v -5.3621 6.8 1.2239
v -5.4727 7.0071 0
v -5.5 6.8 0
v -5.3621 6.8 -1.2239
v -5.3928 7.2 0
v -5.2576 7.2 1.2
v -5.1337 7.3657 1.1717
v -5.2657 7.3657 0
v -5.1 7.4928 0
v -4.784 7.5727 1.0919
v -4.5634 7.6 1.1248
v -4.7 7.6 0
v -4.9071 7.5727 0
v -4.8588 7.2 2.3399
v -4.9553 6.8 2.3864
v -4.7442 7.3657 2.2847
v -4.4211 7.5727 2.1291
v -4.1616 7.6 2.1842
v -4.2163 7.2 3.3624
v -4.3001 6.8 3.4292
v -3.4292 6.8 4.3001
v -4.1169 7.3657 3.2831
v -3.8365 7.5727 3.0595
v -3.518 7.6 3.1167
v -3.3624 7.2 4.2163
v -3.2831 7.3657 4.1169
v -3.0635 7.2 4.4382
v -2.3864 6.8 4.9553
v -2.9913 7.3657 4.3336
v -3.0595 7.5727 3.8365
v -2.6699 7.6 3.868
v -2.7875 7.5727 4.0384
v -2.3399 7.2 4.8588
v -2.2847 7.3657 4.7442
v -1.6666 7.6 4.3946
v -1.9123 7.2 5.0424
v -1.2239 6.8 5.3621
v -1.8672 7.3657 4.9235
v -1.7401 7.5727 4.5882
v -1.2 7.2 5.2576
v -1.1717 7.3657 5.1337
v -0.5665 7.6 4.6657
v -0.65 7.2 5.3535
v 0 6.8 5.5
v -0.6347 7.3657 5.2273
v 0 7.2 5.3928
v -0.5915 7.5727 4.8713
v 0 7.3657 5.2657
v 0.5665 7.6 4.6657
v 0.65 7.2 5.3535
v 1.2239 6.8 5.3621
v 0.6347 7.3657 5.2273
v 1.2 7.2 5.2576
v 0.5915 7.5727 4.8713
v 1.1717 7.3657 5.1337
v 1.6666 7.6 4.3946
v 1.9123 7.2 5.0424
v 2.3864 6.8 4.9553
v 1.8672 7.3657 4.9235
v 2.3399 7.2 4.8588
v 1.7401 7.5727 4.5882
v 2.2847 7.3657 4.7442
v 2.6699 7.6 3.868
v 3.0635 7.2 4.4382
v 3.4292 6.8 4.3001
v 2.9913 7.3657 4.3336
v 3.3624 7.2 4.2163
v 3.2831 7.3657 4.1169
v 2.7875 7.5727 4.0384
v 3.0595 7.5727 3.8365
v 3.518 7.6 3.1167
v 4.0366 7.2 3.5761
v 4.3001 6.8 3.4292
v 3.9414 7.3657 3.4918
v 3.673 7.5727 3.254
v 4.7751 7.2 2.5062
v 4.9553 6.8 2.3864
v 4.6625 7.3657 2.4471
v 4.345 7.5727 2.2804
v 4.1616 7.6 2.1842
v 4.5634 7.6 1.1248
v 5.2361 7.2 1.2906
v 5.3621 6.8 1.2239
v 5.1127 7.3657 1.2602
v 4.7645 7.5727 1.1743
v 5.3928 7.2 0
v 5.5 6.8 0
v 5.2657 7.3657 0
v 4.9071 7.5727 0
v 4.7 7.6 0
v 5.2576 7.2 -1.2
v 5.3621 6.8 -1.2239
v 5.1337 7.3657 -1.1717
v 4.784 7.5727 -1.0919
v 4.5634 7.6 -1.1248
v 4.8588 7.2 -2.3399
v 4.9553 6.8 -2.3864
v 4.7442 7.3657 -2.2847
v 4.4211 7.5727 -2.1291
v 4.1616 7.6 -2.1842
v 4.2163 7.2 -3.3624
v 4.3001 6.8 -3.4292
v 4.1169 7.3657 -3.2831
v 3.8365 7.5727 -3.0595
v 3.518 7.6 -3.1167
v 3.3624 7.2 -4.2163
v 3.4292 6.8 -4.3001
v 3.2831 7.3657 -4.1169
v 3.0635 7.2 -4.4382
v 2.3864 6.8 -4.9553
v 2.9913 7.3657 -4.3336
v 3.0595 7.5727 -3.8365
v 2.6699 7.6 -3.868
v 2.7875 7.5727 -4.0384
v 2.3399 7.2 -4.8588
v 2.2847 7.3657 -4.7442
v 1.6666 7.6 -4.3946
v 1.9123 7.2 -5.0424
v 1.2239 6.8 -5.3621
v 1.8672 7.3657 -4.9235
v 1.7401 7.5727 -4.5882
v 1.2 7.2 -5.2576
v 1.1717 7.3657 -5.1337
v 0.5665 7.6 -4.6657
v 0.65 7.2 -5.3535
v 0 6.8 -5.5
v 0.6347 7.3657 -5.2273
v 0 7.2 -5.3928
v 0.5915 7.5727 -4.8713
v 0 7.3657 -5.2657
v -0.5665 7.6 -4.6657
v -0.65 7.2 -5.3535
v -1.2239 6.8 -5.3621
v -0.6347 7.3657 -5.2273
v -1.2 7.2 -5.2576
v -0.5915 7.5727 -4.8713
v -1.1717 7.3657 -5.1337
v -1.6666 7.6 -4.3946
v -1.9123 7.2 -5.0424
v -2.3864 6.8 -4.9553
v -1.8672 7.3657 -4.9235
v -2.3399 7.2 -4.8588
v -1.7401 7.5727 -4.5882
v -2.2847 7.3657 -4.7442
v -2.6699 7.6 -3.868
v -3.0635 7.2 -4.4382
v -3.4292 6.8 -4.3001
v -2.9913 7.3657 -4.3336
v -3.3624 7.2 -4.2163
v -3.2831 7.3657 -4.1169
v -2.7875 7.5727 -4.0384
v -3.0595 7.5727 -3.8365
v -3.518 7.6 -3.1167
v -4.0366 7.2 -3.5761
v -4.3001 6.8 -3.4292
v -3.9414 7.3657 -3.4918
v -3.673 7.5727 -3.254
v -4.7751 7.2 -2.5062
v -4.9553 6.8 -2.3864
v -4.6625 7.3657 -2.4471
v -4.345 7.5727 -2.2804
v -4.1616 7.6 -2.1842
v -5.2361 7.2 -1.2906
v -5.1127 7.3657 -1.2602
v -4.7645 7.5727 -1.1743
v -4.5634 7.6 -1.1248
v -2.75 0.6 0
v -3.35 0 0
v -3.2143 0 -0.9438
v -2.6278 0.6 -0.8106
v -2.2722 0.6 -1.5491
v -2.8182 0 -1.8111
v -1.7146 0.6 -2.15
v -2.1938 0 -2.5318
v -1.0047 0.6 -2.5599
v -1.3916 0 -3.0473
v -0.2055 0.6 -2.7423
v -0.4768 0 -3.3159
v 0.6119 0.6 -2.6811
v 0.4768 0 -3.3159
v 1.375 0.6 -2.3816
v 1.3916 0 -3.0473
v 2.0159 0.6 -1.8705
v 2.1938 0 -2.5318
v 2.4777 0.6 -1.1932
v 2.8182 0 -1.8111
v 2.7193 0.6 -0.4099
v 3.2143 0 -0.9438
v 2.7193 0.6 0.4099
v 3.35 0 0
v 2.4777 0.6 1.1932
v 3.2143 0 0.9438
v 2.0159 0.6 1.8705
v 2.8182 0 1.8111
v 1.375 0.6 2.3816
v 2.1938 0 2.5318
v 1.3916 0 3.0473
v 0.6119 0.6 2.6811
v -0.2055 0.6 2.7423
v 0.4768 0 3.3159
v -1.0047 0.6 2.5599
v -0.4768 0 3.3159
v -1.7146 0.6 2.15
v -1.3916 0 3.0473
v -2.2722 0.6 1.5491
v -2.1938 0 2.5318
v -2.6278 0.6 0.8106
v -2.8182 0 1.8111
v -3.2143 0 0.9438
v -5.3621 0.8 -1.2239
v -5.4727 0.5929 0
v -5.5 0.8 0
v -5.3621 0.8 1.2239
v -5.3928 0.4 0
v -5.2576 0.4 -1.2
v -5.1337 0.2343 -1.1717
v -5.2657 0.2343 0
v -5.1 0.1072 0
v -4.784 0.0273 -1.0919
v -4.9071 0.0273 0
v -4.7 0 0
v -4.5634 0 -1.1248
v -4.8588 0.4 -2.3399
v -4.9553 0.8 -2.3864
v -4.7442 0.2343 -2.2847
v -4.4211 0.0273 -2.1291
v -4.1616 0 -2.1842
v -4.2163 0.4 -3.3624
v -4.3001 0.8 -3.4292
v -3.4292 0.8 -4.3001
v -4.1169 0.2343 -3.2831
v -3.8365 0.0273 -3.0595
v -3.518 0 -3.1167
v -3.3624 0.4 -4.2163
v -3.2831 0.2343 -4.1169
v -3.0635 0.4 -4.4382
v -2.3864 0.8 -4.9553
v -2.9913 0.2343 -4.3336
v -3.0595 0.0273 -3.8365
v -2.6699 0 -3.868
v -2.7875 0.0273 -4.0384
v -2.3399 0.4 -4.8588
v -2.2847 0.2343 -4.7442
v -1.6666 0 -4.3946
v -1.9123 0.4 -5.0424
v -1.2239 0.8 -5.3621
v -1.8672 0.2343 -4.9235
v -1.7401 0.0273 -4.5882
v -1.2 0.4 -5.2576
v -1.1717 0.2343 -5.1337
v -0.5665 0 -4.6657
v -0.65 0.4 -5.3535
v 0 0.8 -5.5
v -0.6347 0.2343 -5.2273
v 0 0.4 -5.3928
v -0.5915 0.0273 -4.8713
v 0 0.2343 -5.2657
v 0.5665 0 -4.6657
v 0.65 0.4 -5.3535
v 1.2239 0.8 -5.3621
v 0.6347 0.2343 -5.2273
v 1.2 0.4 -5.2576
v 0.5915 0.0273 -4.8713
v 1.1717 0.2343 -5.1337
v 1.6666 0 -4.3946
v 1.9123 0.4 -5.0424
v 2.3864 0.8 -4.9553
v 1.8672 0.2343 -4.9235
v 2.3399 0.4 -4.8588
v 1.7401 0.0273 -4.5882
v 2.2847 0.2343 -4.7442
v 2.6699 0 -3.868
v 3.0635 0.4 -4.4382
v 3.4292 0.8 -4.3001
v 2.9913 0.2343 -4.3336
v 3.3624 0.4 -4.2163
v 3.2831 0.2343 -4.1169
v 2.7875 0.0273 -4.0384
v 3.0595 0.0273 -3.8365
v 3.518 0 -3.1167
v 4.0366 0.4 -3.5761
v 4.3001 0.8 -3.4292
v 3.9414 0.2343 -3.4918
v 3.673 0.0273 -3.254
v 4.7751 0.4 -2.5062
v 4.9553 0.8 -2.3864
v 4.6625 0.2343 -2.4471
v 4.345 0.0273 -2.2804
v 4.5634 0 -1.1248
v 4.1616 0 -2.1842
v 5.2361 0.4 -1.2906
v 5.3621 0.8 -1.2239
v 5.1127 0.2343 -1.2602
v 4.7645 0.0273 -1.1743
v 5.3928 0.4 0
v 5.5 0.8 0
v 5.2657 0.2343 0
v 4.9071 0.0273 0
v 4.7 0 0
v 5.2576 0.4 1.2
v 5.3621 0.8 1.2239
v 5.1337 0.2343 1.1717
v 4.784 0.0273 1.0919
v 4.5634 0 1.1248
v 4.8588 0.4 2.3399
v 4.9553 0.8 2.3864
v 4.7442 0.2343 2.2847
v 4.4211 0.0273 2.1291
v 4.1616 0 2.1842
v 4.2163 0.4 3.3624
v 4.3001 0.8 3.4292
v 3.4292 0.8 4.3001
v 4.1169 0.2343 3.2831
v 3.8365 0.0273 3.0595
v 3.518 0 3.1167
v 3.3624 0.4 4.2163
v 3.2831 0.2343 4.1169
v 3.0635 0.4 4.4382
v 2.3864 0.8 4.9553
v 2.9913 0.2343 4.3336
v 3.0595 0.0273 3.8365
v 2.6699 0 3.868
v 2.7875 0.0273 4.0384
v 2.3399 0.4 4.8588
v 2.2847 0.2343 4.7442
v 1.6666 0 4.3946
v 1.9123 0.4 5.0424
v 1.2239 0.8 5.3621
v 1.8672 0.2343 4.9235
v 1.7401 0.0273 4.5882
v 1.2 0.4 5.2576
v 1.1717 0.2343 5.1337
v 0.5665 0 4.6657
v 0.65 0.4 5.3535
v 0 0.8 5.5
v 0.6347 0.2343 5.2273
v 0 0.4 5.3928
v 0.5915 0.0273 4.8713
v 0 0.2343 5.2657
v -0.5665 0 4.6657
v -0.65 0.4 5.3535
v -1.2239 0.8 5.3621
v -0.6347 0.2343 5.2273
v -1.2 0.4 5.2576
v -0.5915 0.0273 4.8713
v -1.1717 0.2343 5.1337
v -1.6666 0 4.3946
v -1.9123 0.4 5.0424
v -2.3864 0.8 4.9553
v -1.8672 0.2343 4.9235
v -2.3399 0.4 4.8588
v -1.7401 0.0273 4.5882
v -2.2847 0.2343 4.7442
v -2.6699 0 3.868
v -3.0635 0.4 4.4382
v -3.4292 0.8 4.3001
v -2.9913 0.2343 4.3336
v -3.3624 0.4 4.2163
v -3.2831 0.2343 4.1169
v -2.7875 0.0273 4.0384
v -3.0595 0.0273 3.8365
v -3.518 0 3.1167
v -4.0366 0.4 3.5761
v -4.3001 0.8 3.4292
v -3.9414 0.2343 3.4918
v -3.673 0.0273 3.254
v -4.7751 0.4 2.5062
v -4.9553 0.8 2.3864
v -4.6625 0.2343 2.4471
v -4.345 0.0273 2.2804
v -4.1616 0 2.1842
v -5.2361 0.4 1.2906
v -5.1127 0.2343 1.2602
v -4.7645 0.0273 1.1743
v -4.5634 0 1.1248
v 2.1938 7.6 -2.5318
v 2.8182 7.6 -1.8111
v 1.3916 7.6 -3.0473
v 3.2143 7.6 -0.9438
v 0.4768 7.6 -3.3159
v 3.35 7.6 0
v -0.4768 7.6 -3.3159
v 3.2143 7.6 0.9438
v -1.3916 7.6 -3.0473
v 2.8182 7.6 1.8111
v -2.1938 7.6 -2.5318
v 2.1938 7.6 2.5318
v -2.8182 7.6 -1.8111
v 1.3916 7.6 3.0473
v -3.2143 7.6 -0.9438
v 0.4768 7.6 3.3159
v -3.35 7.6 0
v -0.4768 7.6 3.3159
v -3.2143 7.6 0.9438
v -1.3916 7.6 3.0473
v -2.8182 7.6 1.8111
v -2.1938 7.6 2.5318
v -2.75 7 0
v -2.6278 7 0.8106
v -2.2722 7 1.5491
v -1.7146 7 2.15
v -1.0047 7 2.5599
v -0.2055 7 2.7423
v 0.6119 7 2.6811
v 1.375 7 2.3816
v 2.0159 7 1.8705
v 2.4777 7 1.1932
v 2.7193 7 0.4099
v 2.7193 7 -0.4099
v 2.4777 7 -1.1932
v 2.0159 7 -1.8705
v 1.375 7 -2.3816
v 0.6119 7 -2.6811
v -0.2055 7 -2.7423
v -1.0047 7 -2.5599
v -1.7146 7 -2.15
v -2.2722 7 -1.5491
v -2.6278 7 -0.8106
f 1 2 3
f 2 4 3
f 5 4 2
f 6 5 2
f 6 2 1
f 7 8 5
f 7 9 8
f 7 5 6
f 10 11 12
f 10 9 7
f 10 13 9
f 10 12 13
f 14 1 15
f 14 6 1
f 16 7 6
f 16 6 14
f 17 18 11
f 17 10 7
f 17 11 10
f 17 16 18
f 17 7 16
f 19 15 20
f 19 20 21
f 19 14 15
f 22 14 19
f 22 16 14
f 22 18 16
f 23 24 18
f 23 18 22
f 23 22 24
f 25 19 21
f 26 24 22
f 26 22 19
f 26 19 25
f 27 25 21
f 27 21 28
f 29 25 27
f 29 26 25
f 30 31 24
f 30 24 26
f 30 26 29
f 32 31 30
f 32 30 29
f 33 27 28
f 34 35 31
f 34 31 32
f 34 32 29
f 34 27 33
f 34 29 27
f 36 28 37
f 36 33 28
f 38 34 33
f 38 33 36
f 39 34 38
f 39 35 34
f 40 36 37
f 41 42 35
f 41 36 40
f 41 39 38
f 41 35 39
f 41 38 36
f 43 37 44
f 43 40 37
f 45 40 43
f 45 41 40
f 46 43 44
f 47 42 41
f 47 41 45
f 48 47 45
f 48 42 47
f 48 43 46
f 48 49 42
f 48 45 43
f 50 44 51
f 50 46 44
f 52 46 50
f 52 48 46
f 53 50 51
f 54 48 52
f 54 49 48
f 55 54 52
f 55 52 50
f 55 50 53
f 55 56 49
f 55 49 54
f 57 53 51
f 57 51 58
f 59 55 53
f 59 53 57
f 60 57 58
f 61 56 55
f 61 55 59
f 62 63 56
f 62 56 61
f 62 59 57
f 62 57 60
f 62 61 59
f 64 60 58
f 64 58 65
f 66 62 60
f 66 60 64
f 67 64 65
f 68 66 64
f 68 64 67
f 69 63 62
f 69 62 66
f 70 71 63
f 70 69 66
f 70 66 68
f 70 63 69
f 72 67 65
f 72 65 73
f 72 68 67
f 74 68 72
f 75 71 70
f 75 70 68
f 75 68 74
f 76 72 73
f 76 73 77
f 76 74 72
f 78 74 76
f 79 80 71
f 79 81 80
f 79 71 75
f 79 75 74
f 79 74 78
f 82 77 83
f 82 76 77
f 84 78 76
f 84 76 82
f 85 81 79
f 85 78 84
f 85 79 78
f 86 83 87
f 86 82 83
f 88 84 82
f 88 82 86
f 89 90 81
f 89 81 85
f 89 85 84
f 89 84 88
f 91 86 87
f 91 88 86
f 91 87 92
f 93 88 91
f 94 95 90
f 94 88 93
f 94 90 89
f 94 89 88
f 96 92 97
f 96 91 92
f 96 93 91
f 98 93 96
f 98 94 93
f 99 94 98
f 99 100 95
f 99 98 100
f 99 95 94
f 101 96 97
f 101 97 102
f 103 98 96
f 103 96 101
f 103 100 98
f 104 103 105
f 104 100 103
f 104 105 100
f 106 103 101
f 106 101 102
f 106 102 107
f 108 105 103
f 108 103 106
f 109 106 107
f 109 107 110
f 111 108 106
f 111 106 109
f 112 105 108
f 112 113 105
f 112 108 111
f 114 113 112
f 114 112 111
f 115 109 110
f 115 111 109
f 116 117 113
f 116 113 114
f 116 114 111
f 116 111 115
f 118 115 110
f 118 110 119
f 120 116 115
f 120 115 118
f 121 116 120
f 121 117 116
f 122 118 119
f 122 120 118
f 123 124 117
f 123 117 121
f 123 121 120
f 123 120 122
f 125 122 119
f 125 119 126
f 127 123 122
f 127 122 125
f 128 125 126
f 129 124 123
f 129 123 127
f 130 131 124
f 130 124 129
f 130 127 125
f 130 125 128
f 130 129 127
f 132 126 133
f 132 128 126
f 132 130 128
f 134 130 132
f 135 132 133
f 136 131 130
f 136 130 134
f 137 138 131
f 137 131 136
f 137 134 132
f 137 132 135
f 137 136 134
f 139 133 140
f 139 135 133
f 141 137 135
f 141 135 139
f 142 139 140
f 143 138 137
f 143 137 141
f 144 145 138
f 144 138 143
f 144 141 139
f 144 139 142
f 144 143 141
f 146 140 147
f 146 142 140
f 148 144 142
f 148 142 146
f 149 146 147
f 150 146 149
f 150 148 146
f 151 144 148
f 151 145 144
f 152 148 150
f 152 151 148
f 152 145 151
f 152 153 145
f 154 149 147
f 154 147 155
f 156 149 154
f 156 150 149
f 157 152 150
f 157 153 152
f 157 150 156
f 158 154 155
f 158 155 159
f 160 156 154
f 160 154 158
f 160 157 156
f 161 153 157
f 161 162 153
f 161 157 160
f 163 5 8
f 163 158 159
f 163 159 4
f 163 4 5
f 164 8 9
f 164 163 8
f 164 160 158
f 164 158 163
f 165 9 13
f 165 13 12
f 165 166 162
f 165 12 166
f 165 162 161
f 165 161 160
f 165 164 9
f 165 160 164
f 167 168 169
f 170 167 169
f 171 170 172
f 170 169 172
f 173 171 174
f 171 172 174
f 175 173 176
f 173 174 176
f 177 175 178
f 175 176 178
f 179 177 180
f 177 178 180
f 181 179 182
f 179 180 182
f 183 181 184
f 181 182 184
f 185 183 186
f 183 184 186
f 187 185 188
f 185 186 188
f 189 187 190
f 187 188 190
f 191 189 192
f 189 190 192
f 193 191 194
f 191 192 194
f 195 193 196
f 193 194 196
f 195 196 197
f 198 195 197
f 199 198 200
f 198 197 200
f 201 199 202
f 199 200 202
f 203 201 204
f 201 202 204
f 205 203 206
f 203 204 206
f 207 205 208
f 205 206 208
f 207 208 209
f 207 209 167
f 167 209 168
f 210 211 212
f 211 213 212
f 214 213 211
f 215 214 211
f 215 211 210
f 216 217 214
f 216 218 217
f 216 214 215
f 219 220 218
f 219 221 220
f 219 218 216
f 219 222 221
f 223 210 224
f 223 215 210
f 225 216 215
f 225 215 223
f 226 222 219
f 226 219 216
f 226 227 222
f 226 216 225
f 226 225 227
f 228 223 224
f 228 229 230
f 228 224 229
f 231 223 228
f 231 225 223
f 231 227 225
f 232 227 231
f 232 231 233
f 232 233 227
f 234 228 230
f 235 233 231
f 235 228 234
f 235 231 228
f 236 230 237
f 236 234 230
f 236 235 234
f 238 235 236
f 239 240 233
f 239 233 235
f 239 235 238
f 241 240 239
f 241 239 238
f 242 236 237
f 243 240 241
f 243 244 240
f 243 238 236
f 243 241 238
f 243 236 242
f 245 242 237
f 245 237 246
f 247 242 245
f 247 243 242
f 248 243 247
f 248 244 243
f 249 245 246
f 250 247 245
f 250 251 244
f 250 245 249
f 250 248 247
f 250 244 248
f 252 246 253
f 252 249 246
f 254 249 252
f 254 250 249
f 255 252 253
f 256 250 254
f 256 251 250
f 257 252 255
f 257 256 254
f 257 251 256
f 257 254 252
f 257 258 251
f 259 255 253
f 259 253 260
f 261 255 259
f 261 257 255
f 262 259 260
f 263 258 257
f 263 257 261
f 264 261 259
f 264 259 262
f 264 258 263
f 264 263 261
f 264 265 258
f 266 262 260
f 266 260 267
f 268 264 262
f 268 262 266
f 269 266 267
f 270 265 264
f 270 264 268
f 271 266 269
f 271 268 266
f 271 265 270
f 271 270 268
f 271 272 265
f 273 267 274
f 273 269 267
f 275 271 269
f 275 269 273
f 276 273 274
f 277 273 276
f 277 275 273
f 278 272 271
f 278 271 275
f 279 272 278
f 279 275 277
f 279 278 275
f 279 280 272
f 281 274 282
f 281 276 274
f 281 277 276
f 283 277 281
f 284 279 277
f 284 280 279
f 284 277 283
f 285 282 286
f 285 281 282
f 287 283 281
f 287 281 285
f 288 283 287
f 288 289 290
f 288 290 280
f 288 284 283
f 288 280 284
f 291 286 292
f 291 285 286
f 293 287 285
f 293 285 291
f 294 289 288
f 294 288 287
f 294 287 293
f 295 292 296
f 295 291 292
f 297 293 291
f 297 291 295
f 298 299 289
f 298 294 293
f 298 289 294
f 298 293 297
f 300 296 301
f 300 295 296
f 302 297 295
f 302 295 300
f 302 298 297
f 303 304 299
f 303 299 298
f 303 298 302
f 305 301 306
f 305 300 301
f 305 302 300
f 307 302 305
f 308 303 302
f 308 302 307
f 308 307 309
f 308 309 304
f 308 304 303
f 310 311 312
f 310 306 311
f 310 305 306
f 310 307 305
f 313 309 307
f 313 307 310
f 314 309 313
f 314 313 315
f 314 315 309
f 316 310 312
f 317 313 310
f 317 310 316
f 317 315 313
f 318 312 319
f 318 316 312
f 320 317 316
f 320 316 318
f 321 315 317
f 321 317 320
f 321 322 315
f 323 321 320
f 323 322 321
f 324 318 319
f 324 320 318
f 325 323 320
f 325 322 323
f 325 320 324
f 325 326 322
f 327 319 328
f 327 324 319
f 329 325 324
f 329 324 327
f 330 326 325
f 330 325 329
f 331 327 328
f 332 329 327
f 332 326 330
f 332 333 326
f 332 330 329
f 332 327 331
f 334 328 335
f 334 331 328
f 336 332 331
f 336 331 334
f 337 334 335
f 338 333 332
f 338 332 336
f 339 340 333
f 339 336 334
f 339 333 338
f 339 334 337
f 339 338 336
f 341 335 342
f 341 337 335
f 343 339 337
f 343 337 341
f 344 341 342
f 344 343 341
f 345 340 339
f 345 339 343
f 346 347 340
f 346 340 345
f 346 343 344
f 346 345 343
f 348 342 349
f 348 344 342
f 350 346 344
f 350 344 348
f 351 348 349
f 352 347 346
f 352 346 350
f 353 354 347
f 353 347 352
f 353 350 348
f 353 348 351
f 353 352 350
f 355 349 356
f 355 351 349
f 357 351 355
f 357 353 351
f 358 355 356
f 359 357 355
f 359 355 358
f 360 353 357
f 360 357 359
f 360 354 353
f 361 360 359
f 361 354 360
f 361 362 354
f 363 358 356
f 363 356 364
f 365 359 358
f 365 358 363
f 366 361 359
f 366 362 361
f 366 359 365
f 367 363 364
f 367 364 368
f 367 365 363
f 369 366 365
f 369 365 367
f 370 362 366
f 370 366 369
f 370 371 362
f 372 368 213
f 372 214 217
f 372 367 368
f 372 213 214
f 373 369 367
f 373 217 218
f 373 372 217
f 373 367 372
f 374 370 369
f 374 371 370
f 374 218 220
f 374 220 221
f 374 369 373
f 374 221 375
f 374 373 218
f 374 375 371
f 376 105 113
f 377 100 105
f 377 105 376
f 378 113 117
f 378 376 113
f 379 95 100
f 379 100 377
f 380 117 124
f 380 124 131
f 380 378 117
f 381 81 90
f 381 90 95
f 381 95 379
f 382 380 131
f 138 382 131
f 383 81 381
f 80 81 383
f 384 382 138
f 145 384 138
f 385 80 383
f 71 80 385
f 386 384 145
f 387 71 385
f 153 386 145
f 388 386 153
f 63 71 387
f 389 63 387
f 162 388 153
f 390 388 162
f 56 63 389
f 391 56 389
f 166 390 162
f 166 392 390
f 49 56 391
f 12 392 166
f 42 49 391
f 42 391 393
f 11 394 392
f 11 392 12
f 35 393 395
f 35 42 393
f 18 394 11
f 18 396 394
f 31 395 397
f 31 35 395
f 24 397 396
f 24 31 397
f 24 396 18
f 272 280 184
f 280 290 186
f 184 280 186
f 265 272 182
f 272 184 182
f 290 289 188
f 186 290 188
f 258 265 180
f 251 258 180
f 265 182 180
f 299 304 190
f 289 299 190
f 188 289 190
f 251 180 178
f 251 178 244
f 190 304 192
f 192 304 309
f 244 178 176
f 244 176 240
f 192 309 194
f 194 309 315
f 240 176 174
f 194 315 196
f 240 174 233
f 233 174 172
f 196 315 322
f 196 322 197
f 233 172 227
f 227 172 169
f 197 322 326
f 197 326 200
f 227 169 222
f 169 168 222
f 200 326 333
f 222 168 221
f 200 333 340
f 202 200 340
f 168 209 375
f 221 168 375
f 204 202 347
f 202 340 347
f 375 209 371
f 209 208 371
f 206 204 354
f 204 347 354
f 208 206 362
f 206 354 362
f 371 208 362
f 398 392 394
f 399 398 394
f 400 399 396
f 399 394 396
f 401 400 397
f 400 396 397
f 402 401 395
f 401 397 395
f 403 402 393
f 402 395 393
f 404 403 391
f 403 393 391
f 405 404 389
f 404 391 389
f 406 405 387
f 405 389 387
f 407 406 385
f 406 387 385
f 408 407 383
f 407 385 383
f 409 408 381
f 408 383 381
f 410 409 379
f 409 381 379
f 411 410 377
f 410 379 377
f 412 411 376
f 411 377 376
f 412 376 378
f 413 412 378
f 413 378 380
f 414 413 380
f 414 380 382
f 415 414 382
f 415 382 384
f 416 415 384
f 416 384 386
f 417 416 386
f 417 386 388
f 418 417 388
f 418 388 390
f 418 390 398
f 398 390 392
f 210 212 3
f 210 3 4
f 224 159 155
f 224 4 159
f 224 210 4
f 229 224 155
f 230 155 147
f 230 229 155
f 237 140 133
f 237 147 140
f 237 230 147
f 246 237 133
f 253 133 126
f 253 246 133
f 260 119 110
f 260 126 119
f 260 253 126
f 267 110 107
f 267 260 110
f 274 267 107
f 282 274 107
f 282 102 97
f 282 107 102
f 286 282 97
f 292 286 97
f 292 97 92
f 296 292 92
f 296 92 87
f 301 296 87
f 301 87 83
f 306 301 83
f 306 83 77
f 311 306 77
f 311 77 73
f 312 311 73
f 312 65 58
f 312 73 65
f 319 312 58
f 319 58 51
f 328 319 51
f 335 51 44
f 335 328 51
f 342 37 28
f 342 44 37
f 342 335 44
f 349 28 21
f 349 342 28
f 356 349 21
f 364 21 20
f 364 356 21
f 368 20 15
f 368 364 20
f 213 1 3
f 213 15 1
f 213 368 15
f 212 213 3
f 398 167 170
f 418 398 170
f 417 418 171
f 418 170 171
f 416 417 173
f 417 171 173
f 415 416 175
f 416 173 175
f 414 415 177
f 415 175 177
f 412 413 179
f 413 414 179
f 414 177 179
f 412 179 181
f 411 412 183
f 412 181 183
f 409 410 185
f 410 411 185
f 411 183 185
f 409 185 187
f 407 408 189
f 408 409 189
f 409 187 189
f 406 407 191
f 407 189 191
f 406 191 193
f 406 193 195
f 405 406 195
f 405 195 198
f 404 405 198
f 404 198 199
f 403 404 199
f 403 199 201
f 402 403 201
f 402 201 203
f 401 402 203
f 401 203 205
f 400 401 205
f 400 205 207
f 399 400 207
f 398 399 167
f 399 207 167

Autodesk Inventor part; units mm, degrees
ref_plane "YZ Plane" through (0, 0, 0) normal (1, 0, 0) x (0, 1, 0)
ref_plane "XZ Plane" through (0, 0, 0) normal (0, 1, 0) x (-1, 0, 0)
ref_plane "XY Plane" through (0, 0, 0) normal (0, 0, 1) x (1, 0, 0)
sketch "Эскиз1" plane through (0, 0, 0) normal (0, 1, 0) x (-1, 0, 0)
  circle A0 centre (0, 0) radius 2.75
  circle A1 centre (0, 0) radius 5.5
  dimension "d0" = 5.5
  dimension "d1" = 11
extrude "Выдавливание1" add sketch "Эскиз1" along normal blind 7.6
fillet "Сопряжение1" radius 0.8 2 edges at (5.5, 7.6, 0) (5.5, 0, 0)
chamfer "Фаска1" distance 0.6 angle 45 2 edges at (2.75, 7.6, 0) (2.75, 0, 0)
properties part number "prostavka_7,6"
